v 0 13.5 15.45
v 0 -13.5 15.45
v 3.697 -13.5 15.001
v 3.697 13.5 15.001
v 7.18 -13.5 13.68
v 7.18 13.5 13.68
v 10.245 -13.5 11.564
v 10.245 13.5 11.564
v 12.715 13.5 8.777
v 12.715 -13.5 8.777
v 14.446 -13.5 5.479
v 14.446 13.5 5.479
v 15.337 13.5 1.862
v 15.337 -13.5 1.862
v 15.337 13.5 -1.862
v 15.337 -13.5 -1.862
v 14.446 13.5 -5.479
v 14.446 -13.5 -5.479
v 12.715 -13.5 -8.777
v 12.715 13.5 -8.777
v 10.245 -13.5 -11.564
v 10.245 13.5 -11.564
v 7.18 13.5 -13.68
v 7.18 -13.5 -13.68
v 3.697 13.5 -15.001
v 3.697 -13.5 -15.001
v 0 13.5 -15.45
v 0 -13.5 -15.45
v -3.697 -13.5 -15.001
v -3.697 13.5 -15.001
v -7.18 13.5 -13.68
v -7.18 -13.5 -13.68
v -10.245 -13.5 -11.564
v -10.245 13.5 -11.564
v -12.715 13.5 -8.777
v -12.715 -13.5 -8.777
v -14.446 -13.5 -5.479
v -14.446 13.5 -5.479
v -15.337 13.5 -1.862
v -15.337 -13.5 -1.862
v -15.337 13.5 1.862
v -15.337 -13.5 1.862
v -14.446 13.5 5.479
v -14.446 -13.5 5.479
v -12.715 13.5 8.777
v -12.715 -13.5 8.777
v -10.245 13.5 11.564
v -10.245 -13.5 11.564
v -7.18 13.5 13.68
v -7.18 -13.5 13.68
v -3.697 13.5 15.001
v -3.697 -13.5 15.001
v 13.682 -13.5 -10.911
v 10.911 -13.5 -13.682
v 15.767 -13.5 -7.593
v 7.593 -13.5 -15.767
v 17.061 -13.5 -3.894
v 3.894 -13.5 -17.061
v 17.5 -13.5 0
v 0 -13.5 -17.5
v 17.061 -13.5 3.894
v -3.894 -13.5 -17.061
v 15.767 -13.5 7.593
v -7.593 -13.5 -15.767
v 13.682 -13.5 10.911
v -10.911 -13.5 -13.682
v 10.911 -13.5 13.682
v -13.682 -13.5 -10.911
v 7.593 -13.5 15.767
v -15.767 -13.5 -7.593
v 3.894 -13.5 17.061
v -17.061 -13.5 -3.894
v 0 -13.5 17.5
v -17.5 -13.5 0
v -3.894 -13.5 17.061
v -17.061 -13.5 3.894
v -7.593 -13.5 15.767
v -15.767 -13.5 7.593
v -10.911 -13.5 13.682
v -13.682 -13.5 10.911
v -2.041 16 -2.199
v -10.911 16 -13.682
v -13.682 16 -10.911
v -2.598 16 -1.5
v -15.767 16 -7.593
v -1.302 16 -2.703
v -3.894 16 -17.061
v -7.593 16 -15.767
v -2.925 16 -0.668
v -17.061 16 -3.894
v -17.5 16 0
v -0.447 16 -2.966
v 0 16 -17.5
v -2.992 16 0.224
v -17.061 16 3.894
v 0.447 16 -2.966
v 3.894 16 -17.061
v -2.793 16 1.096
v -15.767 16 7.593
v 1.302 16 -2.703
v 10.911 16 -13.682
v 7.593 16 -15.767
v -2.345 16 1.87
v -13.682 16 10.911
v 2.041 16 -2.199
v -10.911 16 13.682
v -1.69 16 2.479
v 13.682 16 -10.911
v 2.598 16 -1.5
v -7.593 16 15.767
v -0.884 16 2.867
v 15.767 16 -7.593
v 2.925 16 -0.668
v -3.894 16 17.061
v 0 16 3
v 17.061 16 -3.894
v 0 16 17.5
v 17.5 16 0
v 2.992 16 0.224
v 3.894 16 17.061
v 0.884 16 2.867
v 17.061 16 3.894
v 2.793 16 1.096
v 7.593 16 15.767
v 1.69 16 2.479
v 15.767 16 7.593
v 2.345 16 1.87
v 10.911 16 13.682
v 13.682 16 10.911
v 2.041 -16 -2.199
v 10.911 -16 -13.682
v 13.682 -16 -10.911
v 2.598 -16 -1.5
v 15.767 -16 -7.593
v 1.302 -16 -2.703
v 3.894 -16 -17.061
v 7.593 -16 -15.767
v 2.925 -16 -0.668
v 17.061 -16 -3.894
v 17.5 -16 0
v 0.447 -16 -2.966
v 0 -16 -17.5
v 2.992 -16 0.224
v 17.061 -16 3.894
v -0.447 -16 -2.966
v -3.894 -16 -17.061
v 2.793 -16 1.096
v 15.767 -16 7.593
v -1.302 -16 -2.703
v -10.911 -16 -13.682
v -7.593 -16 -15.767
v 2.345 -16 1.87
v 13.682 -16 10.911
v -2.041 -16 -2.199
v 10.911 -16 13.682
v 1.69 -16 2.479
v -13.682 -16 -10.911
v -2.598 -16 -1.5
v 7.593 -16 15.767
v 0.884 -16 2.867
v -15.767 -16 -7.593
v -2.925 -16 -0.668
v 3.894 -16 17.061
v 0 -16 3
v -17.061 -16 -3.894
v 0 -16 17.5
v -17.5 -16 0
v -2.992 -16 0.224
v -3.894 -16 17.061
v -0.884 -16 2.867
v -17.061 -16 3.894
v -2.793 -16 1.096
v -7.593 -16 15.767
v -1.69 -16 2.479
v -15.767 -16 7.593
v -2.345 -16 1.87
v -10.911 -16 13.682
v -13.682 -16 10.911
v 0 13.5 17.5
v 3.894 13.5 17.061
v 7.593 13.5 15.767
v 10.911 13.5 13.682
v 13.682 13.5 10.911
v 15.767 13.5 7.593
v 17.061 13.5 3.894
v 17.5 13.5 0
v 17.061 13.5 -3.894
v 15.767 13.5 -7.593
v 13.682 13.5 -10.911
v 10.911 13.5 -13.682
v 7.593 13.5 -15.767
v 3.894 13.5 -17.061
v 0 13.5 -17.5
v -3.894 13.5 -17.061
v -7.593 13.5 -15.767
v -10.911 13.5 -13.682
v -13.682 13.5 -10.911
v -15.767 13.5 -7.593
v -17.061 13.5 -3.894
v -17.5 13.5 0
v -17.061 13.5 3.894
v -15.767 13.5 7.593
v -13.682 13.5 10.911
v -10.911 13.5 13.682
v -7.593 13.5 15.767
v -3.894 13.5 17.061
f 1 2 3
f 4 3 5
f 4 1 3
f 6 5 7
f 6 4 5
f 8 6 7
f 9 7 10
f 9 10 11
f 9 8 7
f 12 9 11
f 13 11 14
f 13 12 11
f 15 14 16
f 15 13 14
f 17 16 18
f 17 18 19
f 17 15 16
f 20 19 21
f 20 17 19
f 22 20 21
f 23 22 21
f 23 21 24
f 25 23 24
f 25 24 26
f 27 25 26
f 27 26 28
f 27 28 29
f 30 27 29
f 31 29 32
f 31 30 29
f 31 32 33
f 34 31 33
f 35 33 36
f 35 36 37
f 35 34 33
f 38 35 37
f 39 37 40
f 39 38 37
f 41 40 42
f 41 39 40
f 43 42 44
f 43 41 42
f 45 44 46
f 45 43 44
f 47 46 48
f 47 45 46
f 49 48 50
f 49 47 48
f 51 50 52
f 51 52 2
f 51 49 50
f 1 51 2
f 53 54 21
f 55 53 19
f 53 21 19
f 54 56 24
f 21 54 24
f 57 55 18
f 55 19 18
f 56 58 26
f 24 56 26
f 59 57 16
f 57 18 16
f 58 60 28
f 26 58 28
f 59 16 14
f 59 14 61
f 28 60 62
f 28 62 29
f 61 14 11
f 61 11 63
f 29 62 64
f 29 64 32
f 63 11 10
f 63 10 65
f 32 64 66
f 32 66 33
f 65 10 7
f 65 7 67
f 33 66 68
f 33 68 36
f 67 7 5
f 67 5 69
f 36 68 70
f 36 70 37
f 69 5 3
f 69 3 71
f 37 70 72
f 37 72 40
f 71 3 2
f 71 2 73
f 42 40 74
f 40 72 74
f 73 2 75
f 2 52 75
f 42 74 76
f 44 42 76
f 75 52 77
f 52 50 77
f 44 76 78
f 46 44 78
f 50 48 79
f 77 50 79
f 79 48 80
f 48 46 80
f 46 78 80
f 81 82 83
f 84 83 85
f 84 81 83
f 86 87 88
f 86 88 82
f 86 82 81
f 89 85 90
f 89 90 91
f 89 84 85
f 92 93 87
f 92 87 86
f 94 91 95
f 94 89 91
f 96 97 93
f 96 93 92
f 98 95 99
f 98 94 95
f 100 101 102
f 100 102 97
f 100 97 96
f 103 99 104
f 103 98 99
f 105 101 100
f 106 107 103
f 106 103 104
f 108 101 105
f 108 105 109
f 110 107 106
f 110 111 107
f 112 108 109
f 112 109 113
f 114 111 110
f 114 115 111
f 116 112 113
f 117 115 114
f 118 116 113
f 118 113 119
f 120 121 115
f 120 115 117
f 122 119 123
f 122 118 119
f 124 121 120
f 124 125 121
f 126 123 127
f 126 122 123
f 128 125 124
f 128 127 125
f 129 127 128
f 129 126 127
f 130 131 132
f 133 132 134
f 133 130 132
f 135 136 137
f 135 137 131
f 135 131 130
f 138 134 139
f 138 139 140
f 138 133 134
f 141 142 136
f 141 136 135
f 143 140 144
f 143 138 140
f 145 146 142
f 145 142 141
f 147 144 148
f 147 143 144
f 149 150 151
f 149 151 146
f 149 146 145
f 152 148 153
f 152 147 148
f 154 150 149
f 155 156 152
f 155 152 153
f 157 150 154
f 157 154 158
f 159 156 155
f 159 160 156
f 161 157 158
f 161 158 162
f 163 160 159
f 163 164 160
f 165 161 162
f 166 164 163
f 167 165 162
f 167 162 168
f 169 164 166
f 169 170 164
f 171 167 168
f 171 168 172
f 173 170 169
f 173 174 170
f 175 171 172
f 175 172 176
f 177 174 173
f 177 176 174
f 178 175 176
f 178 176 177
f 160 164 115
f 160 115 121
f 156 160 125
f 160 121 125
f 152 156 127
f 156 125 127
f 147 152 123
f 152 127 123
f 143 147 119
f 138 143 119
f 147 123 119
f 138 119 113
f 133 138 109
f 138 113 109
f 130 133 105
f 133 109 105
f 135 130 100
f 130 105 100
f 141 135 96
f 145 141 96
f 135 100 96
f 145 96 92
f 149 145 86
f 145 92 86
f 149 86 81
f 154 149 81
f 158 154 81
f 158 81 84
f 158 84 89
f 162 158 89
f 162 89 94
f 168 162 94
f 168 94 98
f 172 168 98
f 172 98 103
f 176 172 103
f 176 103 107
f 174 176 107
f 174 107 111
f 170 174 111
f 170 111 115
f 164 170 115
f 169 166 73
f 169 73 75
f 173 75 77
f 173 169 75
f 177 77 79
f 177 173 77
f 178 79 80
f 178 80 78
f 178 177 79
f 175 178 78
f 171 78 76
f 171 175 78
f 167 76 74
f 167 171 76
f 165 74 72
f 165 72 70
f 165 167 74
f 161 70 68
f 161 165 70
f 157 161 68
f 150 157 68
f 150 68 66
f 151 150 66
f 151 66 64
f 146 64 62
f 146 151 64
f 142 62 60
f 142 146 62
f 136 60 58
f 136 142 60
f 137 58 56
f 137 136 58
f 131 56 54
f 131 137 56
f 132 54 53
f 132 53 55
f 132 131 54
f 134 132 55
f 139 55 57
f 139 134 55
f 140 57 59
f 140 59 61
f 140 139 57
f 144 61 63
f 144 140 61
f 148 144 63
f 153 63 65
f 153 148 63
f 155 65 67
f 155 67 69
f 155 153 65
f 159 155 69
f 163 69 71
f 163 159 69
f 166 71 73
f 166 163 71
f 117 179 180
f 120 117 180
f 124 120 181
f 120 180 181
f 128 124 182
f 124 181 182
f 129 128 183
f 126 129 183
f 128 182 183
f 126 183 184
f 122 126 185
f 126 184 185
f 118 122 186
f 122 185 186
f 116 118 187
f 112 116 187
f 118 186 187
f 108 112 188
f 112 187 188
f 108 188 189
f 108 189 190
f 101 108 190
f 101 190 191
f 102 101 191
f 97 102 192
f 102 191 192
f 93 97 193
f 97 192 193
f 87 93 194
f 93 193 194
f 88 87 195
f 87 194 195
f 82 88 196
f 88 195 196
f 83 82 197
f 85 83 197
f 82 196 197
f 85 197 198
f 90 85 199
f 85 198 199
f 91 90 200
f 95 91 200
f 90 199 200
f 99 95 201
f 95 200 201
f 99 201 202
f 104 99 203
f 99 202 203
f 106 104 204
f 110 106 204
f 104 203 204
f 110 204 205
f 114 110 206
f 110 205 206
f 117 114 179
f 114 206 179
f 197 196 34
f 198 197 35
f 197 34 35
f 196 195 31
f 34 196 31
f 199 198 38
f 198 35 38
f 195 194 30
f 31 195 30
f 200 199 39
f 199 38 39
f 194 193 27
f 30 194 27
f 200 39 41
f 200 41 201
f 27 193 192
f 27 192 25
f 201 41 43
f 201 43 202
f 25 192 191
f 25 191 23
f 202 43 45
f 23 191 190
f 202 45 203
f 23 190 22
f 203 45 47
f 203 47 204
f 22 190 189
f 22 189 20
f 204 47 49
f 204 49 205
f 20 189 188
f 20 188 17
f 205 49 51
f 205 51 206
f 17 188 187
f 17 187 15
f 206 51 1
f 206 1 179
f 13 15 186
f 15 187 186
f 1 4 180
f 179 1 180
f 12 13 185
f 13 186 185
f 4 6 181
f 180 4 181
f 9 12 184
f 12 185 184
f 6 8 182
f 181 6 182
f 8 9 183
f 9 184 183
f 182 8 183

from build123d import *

# Parameters (mm, degrees)
SKETCH_1_R          = 15.45
EXTRUDE_1_DEPTH     = 13.5
SKETCH_2_R          = 17.5
EXTRUDE_2_DEPTH     = 2.5
EXTRUDE_START       = 2.5
SKETCH_3_R          = 17.5
EXTRUDE_3_DEPTH     = 2.5
SKETCH_4_R          = 3
CUT_EXTRUDE_1_DEPTH = 41.453677212


with BuildPart() as part:
    # 草图1 → 凸台-拉伸1 (new, symmetric)
    with BuildSketch(Plane(origin=(0, 0, 0), x_dir=(1, 0, 0), z_dir=(0, 1, 0))):
        with Locations(Location((0, 0, 0), (0, 0, 270))):
            Circle(SKETCH_1_R)
    extrude(amount=EXTRUDE_1_DEPTH, both=True)

    # 草图2 → 凸台-拉伸2 (add)
    with BuildSketch(Plane(origin=(0, 13.5, 0), x_dir=(1, 0, 0), z_dir=(0, 1, 0))):
        with Locations(Location((0, 0, 0), (0, 0, 270))):
            Circle(SKETCH_2_R)
    extrude(amount=EXTRUDE_2_DEPTH)

    # 草图3 → 凸台-拉伸3 (add)
    with BuildSketch(Plane.XZ.offset(13.5).offset(EXTRUDE_START)):
        with Locations(Location((0, 0, 0), (0, 0, 90))):
            Circle(SKETCH_3_R)
    extrude(amount=-EXTRUDE_3_DEPTH)

    # 草图4 → 切除-拉伸1 (cut, through all)
    with BuildSketch(Plane(origin=(0, 16, 0), x_dir=(1, 0, 0), z_dir=(0, 1, 0))):
        with Locations(Location((0, 0, 0), (0, 0, 270))):
            Circle(SKETCH_4_R)
    extrude(amount=-CUT_EXTRUDE_1_DEPTH, mode=Mode.SUBTRACT)


solid = part.part
